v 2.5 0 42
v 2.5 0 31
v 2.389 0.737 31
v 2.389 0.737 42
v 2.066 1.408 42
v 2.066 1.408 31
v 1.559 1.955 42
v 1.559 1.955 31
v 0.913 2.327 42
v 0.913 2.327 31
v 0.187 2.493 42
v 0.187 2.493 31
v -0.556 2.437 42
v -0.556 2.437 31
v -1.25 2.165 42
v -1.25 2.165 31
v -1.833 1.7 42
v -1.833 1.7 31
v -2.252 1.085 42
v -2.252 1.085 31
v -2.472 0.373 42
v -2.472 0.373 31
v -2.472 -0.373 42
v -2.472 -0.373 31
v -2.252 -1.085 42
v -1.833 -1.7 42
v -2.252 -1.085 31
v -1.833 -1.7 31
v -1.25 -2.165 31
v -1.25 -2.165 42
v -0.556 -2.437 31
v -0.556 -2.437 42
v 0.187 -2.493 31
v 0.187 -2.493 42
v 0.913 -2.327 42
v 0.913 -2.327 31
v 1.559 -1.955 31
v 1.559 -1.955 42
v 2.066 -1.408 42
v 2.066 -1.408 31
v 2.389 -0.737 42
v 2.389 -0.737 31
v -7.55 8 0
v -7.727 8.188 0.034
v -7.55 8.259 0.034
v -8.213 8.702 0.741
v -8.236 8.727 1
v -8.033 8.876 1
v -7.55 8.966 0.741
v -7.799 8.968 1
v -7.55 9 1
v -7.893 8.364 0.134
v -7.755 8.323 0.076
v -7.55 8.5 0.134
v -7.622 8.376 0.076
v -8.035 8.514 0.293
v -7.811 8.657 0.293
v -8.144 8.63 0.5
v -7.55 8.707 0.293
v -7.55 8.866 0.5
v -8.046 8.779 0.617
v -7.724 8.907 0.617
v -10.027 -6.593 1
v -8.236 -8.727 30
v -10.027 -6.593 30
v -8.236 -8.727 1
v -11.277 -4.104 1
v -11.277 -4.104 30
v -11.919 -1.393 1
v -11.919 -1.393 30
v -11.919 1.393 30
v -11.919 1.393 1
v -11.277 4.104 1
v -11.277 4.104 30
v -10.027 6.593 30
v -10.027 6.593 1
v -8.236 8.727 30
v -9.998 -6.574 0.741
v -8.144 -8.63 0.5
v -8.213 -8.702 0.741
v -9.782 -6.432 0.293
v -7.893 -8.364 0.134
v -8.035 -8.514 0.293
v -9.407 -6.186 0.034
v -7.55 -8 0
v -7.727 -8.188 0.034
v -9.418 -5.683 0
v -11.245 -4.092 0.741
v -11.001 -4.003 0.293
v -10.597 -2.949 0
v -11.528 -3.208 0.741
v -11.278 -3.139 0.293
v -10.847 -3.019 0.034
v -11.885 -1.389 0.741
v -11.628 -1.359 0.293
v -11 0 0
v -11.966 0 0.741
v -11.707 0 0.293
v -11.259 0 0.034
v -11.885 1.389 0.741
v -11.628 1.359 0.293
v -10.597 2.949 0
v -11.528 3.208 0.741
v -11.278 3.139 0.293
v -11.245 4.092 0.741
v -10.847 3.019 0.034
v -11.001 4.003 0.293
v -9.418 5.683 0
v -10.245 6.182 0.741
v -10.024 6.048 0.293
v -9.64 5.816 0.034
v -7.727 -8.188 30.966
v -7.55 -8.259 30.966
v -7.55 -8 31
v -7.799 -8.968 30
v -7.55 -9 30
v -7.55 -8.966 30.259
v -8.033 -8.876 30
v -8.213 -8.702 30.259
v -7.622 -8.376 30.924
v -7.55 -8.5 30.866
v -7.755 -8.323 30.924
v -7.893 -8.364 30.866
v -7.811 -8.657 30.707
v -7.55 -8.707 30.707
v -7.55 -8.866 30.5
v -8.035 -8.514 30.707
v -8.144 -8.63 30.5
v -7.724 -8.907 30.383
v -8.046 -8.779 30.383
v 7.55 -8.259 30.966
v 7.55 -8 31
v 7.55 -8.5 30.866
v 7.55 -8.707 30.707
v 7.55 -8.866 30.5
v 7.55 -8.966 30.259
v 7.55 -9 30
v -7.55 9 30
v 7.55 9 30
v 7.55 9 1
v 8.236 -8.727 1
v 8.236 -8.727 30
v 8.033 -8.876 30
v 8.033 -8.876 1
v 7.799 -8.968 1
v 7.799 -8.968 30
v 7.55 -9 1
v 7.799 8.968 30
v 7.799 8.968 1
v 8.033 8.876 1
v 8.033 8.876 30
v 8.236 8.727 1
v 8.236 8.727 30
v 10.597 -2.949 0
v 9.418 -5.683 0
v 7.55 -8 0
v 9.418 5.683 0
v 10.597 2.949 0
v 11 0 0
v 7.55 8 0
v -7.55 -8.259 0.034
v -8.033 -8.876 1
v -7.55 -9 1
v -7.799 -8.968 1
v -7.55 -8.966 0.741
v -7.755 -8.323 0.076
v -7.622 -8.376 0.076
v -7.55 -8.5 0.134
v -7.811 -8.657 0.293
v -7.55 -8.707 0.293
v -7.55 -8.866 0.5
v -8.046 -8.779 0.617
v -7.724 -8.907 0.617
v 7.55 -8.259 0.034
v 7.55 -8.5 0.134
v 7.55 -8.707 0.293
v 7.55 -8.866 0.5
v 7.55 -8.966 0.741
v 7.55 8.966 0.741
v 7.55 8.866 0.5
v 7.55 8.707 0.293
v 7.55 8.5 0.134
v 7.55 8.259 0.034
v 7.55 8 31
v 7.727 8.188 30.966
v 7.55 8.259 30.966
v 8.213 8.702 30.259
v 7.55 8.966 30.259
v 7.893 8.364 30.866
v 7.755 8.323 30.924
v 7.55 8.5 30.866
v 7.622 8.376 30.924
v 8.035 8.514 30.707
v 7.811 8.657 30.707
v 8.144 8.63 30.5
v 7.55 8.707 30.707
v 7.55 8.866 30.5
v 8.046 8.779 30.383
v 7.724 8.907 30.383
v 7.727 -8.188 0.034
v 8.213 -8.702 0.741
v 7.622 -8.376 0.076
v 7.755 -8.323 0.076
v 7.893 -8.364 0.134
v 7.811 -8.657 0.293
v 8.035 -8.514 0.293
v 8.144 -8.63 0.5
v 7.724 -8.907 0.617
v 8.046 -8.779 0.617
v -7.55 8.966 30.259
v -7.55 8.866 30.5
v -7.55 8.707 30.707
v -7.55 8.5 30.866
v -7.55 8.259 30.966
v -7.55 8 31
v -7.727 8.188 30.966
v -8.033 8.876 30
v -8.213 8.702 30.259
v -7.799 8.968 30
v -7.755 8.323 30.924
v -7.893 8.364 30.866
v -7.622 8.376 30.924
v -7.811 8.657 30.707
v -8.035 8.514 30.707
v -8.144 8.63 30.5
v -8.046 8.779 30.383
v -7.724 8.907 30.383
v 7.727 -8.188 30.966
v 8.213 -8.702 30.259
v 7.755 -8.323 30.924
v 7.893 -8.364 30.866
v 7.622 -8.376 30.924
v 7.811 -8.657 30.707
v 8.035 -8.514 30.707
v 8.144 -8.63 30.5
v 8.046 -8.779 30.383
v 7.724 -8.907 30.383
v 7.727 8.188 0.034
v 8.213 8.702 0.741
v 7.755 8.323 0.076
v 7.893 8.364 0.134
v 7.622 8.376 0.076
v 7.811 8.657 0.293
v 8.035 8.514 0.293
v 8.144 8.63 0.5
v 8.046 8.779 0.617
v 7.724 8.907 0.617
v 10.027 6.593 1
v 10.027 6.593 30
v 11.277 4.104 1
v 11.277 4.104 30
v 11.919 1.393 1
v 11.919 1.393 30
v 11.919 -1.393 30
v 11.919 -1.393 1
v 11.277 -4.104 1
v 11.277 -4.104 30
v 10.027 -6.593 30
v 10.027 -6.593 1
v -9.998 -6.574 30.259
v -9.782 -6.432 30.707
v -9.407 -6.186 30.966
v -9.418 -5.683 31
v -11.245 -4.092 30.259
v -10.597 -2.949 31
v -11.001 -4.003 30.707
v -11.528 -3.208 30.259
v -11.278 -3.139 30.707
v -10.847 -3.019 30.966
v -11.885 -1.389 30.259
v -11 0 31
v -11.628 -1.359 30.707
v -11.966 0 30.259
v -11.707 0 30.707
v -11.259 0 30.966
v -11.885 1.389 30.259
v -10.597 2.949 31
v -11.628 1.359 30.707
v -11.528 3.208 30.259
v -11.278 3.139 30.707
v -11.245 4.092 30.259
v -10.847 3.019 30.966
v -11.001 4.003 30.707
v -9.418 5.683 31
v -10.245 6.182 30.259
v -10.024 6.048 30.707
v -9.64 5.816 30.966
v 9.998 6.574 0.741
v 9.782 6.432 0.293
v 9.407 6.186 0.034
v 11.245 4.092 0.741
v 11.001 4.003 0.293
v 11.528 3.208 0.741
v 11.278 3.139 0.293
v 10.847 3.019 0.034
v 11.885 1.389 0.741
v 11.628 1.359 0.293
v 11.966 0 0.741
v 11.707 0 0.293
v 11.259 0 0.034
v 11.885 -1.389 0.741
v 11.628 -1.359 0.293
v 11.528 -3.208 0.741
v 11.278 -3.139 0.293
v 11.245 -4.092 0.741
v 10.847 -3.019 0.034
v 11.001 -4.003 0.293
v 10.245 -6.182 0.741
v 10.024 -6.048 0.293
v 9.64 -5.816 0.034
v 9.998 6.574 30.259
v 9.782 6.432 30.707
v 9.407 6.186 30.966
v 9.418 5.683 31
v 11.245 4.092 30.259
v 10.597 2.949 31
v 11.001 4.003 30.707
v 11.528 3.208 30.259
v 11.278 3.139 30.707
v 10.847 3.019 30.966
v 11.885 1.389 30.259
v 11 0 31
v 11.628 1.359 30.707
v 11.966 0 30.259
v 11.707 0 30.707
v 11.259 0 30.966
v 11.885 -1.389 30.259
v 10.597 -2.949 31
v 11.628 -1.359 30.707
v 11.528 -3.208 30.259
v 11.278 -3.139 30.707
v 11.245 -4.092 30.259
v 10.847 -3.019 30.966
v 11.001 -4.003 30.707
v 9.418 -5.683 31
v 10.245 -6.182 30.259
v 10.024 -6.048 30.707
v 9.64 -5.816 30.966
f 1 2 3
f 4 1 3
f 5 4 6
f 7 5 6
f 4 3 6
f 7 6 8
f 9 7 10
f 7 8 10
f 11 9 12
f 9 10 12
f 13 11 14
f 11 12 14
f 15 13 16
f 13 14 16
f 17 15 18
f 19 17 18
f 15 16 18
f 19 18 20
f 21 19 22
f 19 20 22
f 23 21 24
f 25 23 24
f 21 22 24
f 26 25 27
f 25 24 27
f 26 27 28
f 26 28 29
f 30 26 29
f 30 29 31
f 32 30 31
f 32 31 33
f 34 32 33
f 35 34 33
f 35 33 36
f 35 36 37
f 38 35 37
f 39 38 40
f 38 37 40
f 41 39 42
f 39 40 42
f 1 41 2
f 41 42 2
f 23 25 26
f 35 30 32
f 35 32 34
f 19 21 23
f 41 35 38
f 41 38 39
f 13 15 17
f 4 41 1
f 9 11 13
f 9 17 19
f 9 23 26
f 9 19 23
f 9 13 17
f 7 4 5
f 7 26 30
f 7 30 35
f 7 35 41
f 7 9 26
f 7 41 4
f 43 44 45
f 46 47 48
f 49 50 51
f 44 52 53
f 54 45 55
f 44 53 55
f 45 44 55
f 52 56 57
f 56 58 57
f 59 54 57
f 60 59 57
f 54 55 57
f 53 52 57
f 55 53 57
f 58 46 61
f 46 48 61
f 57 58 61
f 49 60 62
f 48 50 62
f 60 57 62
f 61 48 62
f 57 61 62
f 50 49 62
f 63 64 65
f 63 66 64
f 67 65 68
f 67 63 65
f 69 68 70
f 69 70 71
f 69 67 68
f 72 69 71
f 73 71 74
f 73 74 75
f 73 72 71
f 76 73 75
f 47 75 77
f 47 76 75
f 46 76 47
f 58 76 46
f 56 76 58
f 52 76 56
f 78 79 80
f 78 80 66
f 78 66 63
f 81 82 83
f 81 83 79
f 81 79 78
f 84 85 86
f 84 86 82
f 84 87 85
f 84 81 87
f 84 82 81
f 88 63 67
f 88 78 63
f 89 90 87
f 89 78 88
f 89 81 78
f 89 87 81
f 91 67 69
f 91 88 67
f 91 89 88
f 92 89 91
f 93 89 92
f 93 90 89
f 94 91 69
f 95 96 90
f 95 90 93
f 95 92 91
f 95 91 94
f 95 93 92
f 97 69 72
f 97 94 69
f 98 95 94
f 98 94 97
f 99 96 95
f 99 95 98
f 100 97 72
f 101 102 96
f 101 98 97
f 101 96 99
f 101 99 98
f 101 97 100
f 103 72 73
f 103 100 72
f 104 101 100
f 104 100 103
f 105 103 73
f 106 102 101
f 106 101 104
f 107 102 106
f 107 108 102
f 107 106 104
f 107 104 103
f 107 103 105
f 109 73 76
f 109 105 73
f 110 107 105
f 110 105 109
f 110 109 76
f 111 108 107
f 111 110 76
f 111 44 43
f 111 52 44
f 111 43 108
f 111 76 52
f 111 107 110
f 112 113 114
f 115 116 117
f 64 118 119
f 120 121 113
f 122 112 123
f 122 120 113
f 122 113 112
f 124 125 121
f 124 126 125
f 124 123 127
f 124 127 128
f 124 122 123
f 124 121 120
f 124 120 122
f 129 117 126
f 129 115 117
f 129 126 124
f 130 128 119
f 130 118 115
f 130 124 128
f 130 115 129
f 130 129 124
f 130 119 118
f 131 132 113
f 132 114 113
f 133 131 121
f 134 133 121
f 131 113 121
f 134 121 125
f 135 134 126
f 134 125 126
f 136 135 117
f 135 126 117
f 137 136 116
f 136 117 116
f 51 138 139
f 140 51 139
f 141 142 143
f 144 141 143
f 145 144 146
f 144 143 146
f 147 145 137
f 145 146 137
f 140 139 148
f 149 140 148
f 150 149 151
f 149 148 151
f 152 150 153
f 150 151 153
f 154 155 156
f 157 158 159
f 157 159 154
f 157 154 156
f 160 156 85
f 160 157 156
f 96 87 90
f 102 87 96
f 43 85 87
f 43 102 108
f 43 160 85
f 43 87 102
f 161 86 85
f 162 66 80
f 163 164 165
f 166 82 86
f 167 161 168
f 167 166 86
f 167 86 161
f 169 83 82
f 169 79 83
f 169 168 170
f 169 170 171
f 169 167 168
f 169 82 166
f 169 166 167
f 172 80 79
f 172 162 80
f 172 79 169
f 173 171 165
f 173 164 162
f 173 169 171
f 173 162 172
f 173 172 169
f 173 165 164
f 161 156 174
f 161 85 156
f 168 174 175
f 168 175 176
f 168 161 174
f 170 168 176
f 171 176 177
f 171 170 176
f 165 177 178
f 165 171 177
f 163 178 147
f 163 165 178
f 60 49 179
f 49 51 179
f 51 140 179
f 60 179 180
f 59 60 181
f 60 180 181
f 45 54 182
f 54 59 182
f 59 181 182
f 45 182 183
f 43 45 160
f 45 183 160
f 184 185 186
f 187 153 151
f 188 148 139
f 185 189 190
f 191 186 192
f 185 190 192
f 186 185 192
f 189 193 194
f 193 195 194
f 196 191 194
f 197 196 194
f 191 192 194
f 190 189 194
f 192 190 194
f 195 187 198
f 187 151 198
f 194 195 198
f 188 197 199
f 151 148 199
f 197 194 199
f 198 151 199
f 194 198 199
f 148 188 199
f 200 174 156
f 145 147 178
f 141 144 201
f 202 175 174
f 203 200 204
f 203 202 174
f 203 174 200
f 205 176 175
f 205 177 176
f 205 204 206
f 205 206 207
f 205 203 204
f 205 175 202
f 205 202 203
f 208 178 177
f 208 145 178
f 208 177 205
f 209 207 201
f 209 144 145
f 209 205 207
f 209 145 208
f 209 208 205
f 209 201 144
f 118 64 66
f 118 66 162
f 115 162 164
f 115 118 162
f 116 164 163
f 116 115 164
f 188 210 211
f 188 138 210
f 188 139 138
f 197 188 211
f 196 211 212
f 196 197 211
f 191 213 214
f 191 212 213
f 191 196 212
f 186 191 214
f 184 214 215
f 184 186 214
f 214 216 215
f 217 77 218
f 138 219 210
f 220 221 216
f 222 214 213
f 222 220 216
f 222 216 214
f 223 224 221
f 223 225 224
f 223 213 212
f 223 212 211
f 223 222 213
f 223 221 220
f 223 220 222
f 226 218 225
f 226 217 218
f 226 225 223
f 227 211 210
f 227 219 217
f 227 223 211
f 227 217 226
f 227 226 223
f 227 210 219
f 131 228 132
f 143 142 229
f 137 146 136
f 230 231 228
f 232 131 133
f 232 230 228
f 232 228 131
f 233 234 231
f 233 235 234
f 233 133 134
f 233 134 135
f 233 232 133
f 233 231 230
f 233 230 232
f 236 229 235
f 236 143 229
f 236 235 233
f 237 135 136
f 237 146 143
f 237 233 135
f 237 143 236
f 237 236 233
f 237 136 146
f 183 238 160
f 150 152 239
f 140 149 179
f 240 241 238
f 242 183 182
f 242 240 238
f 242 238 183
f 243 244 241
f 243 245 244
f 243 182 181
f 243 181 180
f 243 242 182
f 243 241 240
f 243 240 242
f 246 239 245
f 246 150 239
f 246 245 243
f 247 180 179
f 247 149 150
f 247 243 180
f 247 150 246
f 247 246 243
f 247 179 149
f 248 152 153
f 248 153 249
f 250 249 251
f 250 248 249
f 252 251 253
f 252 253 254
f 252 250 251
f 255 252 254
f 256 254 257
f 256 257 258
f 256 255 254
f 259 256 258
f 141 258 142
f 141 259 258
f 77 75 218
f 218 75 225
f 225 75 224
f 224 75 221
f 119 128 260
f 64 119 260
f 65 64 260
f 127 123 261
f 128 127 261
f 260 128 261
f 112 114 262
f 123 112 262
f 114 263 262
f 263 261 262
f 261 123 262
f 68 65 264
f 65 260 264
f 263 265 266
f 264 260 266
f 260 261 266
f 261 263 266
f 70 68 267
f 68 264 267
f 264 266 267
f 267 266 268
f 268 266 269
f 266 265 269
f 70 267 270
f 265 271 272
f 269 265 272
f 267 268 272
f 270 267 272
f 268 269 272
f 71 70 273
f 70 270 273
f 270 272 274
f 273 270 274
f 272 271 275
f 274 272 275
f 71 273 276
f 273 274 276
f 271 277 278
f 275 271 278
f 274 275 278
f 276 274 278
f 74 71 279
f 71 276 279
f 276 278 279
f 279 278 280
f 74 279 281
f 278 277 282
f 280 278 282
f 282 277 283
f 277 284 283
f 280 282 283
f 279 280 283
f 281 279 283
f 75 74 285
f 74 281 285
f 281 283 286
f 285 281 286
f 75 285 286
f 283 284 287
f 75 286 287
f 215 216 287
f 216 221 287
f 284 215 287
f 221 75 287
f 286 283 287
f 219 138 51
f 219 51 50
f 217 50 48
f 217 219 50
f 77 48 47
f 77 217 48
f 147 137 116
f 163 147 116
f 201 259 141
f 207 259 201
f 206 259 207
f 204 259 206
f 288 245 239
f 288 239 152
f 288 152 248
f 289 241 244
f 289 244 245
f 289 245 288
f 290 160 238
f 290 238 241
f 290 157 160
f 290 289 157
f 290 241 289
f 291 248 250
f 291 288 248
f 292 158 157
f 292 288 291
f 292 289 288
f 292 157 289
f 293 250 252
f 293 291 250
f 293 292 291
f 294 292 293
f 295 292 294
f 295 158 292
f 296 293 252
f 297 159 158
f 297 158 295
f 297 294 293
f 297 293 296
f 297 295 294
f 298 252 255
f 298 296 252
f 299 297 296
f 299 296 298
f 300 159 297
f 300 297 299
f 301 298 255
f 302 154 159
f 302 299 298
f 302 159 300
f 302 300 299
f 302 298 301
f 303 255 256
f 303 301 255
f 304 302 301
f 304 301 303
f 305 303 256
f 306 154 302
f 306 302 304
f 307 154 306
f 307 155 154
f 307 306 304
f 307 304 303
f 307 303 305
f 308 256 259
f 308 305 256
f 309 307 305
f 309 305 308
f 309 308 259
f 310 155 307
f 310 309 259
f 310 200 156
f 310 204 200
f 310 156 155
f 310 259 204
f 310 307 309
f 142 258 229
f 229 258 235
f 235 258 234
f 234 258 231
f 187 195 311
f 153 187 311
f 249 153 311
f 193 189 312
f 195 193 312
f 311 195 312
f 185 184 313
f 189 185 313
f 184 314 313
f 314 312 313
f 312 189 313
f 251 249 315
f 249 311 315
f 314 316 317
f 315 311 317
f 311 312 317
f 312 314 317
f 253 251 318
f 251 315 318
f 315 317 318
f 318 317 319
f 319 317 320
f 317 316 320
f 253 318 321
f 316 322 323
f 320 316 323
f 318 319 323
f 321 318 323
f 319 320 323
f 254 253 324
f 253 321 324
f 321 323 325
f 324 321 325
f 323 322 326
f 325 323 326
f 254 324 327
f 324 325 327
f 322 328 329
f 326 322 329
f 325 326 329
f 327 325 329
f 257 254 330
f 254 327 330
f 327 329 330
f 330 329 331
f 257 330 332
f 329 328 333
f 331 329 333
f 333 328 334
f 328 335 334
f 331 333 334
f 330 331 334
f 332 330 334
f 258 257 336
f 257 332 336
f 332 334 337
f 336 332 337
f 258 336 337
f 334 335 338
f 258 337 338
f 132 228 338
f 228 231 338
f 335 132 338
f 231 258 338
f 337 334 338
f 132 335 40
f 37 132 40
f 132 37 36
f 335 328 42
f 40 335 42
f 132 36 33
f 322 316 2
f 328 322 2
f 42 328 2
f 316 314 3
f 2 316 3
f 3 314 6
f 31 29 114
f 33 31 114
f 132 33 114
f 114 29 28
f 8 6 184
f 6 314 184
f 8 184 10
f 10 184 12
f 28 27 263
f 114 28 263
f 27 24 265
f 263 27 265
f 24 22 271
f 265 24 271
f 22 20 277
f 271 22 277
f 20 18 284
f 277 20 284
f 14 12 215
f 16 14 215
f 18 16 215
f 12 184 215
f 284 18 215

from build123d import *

# Parameters (mm, degrees)
BOSS_EXTRUDE1_DEPTH = 31
SKETCH3_R           = 2.5
BOSS_EXTRUDE2_DEPTH = 11
FILLET1_R           = 1


with BuildPart() as part:
    # Sketch2 → Boss-Extrude1 (new body)
    with BuildSketch(Plane.XY):
        with BuildLine():
            Line((-7.937253933, 9), (7.937253933, 9))
            ThreePointArc((7.937253933, 9), (12, 0), (7.937253933, -9))
            Line((7.937253933, -9), (-7.937253933, -9))
            ThreePointArc((-7.937253933, -9), (-12, 0), (-7.937253933, 9))
        make_face()
    extrude(amount=BOSS_EXTRUDE1_DEPTH)

    # Sketch3 → Boss-Extrude2 (add)
    with BuildSketch(Plane.XY.offset(31)):
        Circle(SKETCH3_R)
    extrude(amount=BOSS_EXTRUDE2_DEPTH)

    # Fillet1
    fillet1_edges = [part.edges().sort_by_distance(p)[0] for p in [
        (0, -9, 31),
        (-12, 0, 31),
        (0, 9, 31),
        (-12, 0, 0),
        (0, -9, 0),
        (12, 0, 0),
        (0, 9, 0),
        (-7.937253933, 9, 15.5),
        (-7.937253933, -9, 15.5),
        (7.937253933, -9, 15.5),
        (7.937253933, 9, 15.5),
        (12, 0, 31),
    ]]
    fillet(fillet1_edges, radius=FILLET1_R)


solid = part.part
